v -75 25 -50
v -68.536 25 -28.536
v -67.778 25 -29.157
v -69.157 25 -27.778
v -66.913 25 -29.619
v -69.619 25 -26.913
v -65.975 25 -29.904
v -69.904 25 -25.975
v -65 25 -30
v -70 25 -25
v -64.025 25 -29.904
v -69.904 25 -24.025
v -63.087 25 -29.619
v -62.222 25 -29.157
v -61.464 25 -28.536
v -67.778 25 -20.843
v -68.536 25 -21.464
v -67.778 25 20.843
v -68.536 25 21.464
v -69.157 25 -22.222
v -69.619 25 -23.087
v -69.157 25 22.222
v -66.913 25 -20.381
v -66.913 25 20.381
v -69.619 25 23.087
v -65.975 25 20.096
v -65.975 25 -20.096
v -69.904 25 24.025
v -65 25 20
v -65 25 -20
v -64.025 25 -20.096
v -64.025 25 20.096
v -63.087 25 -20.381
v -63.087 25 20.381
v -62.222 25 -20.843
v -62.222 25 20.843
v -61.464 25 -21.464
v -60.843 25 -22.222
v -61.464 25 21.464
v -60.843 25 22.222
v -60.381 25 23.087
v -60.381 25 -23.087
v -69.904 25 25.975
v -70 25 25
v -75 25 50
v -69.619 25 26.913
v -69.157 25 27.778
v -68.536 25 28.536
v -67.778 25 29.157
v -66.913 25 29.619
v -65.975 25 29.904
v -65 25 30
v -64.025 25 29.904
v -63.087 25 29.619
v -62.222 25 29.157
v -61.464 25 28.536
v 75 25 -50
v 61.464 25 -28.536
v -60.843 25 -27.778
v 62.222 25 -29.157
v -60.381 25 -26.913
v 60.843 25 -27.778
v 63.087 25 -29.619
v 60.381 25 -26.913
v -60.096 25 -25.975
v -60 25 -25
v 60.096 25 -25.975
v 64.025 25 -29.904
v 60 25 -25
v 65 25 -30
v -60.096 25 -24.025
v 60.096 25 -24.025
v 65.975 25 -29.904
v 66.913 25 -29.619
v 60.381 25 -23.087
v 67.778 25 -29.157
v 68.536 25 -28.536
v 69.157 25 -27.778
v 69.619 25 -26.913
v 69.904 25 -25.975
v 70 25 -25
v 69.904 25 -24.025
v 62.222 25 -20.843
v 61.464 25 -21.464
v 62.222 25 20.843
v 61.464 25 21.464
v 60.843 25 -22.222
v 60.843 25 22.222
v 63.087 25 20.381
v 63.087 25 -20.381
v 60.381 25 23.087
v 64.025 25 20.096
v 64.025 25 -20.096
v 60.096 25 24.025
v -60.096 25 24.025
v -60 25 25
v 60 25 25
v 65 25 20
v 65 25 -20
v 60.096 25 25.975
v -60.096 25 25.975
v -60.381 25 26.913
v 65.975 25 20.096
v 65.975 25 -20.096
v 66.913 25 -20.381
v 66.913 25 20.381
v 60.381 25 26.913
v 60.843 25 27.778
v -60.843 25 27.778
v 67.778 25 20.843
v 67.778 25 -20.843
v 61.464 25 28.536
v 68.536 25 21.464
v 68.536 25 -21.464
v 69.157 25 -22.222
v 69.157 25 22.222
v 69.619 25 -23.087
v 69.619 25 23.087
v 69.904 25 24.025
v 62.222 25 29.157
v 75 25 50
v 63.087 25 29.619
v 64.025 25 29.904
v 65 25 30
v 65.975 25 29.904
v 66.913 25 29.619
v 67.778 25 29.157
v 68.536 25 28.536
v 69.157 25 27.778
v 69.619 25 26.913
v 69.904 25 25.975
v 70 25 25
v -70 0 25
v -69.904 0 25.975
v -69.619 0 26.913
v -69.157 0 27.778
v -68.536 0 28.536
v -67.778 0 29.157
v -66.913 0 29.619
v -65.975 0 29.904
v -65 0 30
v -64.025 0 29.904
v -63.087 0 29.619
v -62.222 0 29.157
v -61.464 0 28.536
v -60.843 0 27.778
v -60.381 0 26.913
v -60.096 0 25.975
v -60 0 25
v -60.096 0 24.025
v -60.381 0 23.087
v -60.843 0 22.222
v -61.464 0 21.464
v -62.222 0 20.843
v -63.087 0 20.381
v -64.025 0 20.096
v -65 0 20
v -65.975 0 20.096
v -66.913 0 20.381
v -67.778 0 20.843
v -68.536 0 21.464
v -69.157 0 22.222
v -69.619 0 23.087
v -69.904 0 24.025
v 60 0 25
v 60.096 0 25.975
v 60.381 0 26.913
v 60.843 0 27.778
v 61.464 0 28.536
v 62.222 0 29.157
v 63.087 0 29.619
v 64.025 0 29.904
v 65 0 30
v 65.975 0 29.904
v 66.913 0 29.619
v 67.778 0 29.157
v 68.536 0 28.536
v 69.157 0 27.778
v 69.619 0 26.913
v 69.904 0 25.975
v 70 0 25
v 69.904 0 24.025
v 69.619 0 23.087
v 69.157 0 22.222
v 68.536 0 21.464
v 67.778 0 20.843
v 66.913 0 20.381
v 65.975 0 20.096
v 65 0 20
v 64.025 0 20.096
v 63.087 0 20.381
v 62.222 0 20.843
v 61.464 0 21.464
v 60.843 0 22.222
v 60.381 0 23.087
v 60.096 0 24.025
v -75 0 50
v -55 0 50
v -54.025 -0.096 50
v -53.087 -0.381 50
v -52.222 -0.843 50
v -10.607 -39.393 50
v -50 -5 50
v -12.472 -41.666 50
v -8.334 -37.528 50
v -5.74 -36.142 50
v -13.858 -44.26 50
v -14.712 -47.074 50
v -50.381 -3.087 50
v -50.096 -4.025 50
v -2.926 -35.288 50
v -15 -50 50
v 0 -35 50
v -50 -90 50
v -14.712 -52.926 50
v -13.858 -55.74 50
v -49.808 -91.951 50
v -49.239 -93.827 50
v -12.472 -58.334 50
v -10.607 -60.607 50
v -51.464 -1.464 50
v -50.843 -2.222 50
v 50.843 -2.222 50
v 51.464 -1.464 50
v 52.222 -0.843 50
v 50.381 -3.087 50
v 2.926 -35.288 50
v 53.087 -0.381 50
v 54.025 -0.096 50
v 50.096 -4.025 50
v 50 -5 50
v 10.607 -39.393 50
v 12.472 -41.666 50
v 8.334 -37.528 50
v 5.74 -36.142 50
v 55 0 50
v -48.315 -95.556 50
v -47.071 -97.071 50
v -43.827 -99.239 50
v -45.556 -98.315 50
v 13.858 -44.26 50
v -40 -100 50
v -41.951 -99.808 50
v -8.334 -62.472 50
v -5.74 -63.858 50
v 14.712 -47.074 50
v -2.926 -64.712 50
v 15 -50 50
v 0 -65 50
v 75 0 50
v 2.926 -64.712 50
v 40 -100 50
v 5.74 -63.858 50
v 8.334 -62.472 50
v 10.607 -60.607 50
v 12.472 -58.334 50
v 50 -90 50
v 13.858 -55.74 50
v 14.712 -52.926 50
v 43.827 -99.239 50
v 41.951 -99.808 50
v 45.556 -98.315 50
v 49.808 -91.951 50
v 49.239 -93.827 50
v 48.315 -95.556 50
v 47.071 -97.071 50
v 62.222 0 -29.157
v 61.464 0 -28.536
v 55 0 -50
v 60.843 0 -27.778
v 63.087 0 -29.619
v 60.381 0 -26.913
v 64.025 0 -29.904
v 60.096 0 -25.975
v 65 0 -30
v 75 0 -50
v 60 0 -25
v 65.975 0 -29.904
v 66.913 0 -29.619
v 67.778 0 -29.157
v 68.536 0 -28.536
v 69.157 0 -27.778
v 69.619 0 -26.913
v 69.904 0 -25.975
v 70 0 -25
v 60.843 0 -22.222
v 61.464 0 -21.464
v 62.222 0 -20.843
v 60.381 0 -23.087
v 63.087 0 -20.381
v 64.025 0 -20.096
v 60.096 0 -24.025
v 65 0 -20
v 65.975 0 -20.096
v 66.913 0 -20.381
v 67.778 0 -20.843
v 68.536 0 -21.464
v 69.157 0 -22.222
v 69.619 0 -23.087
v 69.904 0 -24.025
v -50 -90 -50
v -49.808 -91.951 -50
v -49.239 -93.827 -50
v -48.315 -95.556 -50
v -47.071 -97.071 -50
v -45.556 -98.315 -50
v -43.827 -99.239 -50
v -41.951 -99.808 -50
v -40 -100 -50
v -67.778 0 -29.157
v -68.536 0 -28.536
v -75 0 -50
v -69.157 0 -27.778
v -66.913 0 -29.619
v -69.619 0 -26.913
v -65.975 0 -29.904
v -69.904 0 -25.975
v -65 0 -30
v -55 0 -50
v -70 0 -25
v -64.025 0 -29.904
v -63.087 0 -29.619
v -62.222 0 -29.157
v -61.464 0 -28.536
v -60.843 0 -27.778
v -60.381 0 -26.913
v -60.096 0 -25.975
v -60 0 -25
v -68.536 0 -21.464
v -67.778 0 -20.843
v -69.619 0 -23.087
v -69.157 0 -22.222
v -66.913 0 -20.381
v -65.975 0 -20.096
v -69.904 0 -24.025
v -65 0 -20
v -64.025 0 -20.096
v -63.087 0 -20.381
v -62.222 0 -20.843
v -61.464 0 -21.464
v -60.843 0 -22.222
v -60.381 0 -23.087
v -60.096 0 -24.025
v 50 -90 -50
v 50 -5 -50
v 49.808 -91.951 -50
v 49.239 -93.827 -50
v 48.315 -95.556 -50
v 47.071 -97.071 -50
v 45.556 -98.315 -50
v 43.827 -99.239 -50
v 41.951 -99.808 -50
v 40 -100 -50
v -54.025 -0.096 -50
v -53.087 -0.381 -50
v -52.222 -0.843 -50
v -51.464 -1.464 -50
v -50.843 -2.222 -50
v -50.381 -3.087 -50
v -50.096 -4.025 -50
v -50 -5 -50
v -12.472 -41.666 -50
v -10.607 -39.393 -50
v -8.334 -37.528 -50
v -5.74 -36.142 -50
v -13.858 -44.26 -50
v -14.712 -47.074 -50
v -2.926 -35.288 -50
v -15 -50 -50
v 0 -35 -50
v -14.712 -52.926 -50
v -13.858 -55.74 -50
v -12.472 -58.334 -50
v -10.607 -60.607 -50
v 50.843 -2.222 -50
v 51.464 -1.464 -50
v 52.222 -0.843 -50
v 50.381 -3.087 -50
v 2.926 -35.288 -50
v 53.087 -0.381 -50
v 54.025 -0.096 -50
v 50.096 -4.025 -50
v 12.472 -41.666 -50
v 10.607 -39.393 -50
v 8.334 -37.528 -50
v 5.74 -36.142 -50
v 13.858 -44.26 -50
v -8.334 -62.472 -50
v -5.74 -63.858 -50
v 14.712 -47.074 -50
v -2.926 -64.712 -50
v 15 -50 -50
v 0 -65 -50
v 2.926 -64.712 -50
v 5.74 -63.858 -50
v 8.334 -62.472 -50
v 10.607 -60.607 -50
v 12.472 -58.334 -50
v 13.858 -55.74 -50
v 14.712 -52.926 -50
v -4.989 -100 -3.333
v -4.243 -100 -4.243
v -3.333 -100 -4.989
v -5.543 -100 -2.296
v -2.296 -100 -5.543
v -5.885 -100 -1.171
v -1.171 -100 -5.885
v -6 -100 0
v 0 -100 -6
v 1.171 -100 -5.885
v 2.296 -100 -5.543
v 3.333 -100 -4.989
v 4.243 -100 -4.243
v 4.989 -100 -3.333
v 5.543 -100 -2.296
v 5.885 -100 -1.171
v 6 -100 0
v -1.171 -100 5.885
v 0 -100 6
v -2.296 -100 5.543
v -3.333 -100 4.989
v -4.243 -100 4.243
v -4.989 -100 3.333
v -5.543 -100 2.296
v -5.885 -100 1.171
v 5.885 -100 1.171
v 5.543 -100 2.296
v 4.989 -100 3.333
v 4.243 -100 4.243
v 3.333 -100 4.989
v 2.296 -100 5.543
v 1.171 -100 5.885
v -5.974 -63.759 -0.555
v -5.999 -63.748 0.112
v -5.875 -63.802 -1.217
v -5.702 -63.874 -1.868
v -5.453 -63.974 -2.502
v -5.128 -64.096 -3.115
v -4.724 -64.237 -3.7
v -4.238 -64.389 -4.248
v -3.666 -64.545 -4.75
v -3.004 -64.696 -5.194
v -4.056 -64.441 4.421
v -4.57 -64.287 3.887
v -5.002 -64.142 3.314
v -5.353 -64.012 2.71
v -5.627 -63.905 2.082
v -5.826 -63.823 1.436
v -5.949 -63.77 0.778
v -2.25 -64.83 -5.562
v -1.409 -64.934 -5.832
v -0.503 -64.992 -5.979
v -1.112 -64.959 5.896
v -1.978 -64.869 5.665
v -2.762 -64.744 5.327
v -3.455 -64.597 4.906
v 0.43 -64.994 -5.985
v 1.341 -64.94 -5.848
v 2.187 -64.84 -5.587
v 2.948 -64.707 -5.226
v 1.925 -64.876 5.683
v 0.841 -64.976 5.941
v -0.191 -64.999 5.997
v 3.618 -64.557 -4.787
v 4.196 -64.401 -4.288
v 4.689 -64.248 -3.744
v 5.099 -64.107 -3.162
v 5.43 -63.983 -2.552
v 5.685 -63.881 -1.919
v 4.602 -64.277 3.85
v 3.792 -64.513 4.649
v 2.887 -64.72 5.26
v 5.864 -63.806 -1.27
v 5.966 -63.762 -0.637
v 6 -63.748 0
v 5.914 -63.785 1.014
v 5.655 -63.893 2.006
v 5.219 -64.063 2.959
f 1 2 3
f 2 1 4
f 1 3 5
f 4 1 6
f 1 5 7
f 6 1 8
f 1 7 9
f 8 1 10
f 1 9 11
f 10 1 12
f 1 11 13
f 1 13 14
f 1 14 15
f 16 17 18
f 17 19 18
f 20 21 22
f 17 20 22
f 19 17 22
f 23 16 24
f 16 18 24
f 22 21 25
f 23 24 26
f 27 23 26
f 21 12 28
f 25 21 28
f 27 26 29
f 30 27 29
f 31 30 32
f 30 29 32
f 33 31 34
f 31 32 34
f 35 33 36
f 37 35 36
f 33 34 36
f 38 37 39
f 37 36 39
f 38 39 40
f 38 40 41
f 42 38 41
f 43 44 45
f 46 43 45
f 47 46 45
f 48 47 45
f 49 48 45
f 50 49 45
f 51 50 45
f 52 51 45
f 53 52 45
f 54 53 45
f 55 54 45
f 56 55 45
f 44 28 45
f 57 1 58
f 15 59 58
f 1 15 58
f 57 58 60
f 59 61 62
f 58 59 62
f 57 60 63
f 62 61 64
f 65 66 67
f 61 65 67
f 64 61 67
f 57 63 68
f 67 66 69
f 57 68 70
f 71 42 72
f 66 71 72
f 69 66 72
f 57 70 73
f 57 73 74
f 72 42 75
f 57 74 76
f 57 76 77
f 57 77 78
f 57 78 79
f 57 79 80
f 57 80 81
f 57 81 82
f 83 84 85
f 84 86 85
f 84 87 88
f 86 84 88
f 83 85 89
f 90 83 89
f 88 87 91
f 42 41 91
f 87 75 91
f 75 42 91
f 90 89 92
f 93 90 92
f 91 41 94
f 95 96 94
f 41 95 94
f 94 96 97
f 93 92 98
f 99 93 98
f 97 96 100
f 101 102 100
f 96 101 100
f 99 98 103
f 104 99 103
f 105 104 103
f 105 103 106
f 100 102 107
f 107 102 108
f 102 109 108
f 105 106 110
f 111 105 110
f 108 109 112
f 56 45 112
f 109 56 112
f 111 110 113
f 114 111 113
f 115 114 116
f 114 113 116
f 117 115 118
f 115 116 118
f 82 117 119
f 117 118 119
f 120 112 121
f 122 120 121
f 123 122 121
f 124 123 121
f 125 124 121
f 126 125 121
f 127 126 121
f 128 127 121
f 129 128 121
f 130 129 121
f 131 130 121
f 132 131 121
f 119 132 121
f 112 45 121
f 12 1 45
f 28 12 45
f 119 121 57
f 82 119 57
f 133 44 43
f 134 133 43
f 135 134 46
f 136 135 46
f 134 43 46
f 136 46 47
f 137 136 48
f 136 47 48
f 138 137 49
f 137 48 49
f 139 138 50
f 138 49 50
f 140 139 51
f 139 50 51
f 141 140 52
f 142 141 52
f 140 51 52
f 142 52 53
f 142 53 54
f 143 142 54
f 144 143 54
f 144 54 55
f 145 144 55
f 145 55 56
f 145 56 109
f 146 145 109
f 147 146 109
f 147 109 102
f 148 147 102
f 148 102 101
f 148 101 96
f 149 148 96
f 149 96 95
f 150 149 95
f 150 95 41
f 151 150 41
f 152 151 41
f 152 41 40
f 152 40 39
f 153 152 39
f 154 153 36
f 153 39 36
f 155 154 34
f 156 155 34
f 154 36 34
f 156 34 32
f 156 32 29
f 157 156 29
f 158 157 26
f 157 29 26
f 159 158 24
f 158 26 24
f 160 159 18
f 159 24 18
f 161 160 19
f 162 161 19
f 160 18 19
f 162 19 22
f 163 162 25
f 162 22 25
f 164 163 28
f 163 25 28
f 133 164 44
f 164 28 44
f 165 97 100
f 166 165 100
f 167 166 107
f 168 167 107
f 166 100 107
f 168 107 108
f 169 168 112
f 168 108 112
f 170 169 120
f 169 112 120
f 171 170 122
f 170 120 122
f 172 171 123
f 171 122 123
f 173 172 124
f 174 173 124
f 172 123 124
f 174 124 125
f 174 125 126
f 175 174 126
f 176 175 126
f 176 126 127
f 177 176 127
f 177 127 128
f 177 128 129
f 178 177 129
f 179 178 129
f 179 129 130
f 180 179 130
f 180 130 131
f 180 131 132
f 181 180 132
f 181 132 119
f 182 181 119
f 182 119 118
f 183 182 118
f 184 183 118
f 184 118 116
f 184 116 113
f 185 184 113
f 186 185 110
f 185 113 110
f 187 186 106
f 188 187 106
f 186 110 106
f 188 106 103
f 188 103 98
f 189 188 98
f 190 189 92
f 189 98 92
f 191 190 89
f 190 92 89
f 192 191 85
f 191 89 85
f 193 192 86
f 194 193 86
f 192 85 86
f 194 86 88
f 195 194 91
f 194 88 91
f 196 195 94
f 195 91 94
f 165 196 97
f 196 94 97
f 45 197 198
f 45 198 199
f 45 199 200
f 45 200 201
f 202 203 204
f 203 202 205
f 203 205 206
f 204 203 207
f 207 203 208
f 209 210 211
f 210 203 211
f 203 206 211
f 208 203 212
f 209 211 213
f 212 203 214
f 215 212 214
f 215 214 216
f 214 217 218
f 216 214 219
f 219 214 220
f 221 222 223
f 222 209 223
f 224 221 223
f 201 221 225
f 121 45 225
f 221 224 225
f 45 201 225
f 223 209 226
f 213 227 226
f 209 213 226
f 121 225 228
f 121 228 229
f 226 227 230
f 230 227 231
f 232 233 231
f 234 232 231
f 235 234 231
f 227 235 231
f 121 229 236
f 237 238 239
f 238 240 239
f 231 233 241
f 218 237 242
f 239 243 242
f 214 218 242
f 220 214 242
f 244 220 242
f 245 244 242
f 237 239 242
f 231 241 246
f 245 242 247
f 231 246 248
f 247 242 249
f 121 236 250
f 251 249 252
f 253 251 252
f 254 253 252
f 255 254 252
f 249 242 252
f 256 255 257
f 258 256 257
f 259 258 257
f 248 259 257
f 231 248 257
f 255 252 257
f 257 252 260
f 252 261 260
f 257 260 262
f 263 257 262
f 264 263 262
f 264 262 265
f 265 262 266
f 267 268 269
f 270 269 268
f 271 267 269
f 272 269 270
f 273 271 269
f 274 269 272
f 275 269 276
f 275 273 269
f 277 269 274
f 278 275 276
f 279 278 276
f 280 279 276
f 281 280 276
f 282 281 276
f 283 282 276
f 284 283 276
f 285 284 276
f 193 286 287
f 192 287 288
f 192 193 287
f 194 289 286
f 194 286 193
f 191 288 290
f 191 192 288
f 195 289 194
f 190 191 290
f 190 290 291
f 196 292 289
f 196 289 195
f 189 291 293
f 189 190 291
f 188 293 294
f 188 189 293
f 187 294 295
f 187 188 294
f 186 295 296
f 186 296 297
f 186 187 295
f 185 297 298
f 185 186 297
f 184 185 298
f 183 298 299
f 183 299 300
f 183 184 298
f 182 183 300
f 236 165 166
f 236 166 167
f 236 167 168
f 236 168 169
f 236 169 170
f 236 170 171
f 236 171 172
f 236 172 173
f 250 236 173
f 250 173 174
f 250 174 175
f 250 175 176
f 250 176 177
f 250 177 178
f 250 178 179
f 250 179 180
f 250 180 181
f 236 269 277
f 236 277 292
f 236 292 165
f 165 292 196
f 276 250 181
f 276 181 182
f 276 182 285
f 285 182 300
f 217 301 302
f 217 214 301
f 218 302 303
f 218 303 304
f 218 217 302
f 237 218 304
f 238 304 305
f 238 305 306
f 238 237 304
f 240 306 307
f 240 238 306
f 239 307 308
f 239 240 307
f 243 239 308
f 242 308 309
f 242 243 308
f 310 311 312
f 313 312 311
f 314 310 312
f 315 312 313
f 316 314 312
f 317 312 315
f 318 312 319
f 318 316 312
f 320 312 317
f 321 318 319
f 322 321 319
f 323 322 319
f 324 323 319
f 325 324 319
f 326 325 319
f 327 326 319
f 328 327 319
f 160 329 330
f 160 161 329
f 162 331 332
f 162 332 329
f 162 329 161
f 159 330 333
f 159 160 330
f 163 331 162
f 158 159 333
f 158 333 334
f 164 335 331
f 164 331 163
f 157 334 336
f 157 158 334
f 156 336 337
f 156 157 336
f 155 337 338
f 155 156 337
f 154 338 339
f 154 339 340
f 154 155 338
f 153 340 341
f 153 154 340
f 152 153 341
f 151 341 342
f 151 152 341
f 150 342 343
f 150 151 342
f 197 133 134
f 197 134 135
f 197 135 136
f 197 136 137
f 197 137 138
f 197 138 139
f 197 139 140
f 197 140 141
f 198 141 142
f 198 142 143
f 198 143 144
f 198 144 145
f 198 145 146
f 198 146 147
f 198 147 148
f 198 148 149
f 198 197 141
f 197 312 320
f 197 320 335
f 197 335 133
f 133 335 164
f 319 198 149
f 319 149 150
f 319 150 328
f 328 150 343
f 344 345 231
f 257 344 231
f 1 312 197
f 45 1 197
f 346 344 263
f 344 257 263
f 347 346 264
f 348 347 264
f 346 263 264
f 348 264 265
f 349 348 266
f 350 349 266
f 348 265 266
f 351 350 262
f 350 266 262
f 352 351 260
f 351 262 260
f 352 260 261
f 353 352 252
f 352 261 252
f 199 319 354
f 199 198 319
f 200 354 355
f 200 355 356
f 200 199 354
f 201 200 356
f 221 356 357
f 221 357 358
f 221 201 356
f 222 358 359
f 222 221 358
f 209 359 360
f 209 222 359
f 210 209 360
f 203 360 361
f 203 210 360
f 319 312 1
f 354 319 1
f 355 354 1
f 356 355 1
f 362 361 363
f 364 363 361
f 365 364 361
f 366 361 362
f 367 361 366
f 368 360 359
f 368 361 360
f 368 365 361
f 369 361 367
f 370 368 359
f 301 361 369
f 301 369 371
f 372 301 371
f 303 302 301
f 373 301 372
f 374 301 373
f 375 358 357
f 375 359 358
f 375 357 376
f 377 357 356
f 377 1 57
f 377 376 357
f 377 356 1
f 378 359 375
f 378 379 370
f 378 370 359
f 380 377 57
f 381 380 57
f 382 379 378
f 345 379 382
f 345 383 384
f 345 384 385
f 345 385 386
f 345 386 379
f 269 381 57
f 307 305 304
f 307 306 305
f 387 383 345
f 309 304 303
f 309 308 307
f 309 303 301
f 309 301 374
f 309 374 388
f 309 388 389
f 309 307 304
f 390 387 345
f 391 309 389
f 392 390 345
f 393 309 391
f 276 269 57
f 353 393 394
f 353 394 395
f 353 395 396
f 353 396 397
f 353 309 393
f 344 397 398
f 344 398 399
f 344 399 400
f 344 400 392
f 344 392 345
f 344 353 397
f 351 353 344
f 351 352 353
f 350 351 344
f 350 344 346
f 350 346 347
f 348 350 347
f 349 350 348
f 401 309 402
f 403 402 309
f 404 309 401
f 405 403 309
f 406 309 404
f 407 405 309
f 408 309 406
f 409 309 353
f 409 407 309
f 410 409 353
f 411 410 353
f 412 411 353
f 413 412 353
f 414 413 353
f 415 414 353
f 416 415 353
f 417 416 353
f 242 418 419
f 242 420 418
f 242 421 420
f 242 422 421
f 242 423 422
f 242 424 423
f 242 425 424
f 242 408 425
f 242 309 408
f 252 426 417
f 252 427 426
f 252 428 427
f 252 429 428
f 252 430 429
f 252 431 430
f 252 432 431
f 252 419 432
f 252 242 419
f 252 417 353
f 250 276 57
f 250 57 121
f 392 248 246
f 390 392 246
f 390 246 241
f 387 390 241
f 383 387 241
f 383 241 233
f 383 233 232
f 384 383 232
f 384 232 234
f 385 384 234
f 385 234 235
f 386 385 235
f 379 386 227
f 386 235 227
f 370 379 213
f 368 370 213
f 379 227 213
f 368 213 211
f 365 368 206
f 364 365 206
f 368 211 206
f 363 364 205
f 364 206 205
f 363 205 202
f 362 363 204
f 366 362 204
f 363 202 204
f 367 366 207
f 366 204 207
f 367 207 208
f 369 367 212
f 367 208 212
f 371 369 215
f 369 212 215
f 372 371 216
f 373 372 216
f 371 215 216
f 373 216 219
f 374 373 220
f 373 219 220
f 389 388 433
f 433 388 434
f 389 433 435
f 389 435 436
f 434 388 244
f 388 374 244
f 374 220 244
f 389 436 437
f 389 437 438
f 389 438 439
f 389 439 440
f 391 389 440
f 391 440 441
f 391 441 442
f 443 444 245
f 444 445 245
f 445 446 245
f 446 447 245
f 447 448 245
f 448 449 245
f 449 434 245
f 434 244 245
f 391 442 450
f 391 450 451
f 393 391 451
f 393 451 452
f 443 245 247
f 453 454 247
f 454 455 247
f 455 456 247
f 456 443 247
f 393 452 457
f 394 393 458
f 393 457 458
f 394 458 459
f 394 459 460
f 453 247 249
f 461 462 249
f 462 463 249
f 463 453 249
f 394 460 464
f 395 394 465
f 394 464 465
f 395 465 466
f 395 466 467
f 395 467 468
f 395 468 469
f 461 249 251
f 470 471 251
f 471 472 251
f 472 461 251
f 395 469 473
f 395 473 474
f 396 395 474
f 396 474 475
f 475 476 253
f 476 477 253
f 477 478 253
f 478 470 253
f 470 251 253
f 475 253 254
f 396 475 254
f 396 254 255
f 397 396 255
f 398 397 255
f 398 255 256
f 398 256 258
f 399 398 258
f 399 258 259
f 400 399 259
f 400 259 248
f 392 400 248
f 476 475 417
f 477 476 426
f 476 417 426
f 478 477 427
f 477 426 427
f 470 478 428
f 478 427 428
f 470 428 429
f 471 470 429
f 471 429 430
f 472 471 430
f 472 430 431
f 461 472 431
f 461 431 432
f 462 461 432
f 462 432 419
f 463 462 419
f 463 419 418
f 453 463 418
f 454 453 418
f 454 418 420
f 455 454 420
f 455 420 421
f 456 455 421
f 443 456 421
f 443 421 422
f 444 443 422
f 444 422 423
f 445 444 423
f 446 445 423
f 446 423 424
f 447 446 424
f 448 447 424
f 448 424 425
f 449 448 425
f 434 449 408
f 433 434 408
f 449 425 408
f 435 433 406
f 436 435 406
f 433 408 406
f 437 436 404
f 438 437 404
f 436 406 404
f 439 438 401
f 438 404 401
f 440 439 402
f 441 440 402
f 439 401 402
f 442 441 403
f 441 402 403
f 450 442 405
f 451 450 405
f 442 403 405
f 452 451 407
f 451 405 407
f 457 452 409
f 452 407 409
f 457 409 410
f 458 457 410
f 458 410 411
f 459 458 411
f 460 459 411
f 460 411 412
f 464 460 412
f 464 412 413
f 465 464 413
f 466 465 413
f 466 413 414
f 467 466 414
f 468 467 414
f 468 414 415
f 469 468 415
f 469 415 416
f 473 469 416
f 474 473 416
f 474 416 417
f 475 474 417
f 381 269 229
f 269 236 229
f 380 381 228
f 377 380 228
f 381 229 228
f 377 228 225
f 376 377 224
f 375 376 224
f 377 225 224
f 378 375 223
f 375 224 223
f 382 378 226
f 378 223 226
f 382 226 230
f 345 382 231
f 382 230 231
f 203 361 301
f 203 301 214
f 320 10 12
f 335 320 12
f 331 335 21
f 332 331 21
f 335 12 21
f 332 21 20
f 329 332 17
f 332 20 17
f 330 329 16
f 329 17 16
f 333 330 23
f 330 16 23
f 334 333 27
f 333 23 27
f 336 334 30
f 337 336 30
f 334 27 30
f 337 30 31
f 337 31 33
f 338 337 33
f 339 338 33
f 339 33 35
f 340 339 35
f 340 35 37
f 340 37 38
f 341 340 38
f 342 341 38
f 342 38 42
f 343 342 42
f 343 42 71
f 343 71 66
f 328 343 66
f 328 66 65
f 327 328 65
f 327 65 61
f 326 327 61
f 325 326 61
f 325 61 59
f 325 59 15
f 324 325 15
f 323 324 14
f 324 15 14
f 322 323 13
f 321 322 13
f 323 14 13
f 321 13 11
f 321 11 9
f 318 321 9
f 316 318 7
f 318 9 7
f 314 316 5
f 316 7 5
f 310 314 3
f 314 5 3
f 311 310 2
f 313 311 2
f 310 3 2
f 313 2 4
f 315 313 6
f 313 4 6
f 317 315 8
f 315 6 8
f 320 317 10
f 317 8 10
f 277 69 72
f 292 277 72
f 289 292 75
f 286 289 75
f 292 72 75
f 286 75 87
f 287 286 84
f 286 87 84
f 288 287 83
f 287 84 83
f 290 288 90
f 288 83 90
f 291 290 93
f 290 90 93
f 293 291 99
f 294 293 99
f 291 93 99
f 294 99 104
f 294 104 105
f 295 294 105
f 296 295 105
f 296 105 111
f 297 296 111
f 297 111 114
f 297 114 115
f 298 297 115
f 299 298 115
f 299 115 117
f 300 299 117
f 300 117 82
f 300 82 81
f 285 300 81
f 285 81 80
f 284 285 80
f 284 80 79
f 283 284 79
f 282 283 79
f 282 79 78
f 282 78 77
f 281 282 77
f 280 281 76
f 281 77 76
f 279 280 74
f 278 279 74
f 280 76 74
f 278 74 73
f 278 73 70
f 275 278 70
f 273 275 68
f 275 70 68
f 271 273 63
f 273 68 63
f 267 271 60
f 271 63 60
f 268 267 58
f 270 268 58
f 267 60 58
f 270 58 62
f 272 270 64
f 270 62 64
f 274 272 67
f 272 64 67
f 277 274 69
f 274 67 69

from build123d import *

# Parameters (mm, degrees)
F0_W     = 100
F0_H     = 100
F1_DEPTH = 100
F2_R     = 10
F3_R     = 15
F4_DEPTH = 100.001
F5_R     = 6
F6_DEPTH = 36.2532730151
F7_W     = 150
F7_H     = 100
F8_DEPTH = 25
F9_R     = 5
F11_D    = 10


with BuildPart() as f1:
    # F0 (on Front) → F1 (new body)
    with BuildSketch(Plane.XZ):
        Rectangle(F0_W, F0_H)
    extrude(amount=F1_DEPTH)

    # F2
    f2_edges = [f1.edges().sort_by_distance(p)[0] for p in [
        (50, -100, 0),
        (-50, -100, 0),
    ]]
    fillet(f2_edges, radius=F2_R)

    # F3 (on face) → F4 (cut, through all)
    with BuildSketch(Plane.XY.offset(50)):
        with Locations((0, -50)):
            Circle(F3_R)
    extrude(amount=-F4_DEPTH, mode=Mode.SUBTRACT)

    # F5 (on face) → F6 (cut, through all)
    with BuildSketch(Plane.XZ.offset(100)):
        Circle(F5_R)
    extrude(amount=-F6_DEPTH, mode=Mode.SUBTRACT)

    # F7 (on Front) → F8 (join)
    with BuildSketch(Plane.XZ):
        Rectangle(F7_W, F7_H)
    extrude(amount=-F8_DEPTH)

    # F9
    f9_edges = [f1.edges().sort_by_distance(p)[0] for p in [
        (50, 0, 0),
        (-50, 0, 0),
    ]]
    fillet(f9_edges, radius=F9_R)

    # F11 (through all)
    with Locations(Plane.XZ):
        with Locations((-65, 25), (-65, -25), (65, 25), (65, -25)):
            Hole(F11_D / 2)


solid = f1.part
